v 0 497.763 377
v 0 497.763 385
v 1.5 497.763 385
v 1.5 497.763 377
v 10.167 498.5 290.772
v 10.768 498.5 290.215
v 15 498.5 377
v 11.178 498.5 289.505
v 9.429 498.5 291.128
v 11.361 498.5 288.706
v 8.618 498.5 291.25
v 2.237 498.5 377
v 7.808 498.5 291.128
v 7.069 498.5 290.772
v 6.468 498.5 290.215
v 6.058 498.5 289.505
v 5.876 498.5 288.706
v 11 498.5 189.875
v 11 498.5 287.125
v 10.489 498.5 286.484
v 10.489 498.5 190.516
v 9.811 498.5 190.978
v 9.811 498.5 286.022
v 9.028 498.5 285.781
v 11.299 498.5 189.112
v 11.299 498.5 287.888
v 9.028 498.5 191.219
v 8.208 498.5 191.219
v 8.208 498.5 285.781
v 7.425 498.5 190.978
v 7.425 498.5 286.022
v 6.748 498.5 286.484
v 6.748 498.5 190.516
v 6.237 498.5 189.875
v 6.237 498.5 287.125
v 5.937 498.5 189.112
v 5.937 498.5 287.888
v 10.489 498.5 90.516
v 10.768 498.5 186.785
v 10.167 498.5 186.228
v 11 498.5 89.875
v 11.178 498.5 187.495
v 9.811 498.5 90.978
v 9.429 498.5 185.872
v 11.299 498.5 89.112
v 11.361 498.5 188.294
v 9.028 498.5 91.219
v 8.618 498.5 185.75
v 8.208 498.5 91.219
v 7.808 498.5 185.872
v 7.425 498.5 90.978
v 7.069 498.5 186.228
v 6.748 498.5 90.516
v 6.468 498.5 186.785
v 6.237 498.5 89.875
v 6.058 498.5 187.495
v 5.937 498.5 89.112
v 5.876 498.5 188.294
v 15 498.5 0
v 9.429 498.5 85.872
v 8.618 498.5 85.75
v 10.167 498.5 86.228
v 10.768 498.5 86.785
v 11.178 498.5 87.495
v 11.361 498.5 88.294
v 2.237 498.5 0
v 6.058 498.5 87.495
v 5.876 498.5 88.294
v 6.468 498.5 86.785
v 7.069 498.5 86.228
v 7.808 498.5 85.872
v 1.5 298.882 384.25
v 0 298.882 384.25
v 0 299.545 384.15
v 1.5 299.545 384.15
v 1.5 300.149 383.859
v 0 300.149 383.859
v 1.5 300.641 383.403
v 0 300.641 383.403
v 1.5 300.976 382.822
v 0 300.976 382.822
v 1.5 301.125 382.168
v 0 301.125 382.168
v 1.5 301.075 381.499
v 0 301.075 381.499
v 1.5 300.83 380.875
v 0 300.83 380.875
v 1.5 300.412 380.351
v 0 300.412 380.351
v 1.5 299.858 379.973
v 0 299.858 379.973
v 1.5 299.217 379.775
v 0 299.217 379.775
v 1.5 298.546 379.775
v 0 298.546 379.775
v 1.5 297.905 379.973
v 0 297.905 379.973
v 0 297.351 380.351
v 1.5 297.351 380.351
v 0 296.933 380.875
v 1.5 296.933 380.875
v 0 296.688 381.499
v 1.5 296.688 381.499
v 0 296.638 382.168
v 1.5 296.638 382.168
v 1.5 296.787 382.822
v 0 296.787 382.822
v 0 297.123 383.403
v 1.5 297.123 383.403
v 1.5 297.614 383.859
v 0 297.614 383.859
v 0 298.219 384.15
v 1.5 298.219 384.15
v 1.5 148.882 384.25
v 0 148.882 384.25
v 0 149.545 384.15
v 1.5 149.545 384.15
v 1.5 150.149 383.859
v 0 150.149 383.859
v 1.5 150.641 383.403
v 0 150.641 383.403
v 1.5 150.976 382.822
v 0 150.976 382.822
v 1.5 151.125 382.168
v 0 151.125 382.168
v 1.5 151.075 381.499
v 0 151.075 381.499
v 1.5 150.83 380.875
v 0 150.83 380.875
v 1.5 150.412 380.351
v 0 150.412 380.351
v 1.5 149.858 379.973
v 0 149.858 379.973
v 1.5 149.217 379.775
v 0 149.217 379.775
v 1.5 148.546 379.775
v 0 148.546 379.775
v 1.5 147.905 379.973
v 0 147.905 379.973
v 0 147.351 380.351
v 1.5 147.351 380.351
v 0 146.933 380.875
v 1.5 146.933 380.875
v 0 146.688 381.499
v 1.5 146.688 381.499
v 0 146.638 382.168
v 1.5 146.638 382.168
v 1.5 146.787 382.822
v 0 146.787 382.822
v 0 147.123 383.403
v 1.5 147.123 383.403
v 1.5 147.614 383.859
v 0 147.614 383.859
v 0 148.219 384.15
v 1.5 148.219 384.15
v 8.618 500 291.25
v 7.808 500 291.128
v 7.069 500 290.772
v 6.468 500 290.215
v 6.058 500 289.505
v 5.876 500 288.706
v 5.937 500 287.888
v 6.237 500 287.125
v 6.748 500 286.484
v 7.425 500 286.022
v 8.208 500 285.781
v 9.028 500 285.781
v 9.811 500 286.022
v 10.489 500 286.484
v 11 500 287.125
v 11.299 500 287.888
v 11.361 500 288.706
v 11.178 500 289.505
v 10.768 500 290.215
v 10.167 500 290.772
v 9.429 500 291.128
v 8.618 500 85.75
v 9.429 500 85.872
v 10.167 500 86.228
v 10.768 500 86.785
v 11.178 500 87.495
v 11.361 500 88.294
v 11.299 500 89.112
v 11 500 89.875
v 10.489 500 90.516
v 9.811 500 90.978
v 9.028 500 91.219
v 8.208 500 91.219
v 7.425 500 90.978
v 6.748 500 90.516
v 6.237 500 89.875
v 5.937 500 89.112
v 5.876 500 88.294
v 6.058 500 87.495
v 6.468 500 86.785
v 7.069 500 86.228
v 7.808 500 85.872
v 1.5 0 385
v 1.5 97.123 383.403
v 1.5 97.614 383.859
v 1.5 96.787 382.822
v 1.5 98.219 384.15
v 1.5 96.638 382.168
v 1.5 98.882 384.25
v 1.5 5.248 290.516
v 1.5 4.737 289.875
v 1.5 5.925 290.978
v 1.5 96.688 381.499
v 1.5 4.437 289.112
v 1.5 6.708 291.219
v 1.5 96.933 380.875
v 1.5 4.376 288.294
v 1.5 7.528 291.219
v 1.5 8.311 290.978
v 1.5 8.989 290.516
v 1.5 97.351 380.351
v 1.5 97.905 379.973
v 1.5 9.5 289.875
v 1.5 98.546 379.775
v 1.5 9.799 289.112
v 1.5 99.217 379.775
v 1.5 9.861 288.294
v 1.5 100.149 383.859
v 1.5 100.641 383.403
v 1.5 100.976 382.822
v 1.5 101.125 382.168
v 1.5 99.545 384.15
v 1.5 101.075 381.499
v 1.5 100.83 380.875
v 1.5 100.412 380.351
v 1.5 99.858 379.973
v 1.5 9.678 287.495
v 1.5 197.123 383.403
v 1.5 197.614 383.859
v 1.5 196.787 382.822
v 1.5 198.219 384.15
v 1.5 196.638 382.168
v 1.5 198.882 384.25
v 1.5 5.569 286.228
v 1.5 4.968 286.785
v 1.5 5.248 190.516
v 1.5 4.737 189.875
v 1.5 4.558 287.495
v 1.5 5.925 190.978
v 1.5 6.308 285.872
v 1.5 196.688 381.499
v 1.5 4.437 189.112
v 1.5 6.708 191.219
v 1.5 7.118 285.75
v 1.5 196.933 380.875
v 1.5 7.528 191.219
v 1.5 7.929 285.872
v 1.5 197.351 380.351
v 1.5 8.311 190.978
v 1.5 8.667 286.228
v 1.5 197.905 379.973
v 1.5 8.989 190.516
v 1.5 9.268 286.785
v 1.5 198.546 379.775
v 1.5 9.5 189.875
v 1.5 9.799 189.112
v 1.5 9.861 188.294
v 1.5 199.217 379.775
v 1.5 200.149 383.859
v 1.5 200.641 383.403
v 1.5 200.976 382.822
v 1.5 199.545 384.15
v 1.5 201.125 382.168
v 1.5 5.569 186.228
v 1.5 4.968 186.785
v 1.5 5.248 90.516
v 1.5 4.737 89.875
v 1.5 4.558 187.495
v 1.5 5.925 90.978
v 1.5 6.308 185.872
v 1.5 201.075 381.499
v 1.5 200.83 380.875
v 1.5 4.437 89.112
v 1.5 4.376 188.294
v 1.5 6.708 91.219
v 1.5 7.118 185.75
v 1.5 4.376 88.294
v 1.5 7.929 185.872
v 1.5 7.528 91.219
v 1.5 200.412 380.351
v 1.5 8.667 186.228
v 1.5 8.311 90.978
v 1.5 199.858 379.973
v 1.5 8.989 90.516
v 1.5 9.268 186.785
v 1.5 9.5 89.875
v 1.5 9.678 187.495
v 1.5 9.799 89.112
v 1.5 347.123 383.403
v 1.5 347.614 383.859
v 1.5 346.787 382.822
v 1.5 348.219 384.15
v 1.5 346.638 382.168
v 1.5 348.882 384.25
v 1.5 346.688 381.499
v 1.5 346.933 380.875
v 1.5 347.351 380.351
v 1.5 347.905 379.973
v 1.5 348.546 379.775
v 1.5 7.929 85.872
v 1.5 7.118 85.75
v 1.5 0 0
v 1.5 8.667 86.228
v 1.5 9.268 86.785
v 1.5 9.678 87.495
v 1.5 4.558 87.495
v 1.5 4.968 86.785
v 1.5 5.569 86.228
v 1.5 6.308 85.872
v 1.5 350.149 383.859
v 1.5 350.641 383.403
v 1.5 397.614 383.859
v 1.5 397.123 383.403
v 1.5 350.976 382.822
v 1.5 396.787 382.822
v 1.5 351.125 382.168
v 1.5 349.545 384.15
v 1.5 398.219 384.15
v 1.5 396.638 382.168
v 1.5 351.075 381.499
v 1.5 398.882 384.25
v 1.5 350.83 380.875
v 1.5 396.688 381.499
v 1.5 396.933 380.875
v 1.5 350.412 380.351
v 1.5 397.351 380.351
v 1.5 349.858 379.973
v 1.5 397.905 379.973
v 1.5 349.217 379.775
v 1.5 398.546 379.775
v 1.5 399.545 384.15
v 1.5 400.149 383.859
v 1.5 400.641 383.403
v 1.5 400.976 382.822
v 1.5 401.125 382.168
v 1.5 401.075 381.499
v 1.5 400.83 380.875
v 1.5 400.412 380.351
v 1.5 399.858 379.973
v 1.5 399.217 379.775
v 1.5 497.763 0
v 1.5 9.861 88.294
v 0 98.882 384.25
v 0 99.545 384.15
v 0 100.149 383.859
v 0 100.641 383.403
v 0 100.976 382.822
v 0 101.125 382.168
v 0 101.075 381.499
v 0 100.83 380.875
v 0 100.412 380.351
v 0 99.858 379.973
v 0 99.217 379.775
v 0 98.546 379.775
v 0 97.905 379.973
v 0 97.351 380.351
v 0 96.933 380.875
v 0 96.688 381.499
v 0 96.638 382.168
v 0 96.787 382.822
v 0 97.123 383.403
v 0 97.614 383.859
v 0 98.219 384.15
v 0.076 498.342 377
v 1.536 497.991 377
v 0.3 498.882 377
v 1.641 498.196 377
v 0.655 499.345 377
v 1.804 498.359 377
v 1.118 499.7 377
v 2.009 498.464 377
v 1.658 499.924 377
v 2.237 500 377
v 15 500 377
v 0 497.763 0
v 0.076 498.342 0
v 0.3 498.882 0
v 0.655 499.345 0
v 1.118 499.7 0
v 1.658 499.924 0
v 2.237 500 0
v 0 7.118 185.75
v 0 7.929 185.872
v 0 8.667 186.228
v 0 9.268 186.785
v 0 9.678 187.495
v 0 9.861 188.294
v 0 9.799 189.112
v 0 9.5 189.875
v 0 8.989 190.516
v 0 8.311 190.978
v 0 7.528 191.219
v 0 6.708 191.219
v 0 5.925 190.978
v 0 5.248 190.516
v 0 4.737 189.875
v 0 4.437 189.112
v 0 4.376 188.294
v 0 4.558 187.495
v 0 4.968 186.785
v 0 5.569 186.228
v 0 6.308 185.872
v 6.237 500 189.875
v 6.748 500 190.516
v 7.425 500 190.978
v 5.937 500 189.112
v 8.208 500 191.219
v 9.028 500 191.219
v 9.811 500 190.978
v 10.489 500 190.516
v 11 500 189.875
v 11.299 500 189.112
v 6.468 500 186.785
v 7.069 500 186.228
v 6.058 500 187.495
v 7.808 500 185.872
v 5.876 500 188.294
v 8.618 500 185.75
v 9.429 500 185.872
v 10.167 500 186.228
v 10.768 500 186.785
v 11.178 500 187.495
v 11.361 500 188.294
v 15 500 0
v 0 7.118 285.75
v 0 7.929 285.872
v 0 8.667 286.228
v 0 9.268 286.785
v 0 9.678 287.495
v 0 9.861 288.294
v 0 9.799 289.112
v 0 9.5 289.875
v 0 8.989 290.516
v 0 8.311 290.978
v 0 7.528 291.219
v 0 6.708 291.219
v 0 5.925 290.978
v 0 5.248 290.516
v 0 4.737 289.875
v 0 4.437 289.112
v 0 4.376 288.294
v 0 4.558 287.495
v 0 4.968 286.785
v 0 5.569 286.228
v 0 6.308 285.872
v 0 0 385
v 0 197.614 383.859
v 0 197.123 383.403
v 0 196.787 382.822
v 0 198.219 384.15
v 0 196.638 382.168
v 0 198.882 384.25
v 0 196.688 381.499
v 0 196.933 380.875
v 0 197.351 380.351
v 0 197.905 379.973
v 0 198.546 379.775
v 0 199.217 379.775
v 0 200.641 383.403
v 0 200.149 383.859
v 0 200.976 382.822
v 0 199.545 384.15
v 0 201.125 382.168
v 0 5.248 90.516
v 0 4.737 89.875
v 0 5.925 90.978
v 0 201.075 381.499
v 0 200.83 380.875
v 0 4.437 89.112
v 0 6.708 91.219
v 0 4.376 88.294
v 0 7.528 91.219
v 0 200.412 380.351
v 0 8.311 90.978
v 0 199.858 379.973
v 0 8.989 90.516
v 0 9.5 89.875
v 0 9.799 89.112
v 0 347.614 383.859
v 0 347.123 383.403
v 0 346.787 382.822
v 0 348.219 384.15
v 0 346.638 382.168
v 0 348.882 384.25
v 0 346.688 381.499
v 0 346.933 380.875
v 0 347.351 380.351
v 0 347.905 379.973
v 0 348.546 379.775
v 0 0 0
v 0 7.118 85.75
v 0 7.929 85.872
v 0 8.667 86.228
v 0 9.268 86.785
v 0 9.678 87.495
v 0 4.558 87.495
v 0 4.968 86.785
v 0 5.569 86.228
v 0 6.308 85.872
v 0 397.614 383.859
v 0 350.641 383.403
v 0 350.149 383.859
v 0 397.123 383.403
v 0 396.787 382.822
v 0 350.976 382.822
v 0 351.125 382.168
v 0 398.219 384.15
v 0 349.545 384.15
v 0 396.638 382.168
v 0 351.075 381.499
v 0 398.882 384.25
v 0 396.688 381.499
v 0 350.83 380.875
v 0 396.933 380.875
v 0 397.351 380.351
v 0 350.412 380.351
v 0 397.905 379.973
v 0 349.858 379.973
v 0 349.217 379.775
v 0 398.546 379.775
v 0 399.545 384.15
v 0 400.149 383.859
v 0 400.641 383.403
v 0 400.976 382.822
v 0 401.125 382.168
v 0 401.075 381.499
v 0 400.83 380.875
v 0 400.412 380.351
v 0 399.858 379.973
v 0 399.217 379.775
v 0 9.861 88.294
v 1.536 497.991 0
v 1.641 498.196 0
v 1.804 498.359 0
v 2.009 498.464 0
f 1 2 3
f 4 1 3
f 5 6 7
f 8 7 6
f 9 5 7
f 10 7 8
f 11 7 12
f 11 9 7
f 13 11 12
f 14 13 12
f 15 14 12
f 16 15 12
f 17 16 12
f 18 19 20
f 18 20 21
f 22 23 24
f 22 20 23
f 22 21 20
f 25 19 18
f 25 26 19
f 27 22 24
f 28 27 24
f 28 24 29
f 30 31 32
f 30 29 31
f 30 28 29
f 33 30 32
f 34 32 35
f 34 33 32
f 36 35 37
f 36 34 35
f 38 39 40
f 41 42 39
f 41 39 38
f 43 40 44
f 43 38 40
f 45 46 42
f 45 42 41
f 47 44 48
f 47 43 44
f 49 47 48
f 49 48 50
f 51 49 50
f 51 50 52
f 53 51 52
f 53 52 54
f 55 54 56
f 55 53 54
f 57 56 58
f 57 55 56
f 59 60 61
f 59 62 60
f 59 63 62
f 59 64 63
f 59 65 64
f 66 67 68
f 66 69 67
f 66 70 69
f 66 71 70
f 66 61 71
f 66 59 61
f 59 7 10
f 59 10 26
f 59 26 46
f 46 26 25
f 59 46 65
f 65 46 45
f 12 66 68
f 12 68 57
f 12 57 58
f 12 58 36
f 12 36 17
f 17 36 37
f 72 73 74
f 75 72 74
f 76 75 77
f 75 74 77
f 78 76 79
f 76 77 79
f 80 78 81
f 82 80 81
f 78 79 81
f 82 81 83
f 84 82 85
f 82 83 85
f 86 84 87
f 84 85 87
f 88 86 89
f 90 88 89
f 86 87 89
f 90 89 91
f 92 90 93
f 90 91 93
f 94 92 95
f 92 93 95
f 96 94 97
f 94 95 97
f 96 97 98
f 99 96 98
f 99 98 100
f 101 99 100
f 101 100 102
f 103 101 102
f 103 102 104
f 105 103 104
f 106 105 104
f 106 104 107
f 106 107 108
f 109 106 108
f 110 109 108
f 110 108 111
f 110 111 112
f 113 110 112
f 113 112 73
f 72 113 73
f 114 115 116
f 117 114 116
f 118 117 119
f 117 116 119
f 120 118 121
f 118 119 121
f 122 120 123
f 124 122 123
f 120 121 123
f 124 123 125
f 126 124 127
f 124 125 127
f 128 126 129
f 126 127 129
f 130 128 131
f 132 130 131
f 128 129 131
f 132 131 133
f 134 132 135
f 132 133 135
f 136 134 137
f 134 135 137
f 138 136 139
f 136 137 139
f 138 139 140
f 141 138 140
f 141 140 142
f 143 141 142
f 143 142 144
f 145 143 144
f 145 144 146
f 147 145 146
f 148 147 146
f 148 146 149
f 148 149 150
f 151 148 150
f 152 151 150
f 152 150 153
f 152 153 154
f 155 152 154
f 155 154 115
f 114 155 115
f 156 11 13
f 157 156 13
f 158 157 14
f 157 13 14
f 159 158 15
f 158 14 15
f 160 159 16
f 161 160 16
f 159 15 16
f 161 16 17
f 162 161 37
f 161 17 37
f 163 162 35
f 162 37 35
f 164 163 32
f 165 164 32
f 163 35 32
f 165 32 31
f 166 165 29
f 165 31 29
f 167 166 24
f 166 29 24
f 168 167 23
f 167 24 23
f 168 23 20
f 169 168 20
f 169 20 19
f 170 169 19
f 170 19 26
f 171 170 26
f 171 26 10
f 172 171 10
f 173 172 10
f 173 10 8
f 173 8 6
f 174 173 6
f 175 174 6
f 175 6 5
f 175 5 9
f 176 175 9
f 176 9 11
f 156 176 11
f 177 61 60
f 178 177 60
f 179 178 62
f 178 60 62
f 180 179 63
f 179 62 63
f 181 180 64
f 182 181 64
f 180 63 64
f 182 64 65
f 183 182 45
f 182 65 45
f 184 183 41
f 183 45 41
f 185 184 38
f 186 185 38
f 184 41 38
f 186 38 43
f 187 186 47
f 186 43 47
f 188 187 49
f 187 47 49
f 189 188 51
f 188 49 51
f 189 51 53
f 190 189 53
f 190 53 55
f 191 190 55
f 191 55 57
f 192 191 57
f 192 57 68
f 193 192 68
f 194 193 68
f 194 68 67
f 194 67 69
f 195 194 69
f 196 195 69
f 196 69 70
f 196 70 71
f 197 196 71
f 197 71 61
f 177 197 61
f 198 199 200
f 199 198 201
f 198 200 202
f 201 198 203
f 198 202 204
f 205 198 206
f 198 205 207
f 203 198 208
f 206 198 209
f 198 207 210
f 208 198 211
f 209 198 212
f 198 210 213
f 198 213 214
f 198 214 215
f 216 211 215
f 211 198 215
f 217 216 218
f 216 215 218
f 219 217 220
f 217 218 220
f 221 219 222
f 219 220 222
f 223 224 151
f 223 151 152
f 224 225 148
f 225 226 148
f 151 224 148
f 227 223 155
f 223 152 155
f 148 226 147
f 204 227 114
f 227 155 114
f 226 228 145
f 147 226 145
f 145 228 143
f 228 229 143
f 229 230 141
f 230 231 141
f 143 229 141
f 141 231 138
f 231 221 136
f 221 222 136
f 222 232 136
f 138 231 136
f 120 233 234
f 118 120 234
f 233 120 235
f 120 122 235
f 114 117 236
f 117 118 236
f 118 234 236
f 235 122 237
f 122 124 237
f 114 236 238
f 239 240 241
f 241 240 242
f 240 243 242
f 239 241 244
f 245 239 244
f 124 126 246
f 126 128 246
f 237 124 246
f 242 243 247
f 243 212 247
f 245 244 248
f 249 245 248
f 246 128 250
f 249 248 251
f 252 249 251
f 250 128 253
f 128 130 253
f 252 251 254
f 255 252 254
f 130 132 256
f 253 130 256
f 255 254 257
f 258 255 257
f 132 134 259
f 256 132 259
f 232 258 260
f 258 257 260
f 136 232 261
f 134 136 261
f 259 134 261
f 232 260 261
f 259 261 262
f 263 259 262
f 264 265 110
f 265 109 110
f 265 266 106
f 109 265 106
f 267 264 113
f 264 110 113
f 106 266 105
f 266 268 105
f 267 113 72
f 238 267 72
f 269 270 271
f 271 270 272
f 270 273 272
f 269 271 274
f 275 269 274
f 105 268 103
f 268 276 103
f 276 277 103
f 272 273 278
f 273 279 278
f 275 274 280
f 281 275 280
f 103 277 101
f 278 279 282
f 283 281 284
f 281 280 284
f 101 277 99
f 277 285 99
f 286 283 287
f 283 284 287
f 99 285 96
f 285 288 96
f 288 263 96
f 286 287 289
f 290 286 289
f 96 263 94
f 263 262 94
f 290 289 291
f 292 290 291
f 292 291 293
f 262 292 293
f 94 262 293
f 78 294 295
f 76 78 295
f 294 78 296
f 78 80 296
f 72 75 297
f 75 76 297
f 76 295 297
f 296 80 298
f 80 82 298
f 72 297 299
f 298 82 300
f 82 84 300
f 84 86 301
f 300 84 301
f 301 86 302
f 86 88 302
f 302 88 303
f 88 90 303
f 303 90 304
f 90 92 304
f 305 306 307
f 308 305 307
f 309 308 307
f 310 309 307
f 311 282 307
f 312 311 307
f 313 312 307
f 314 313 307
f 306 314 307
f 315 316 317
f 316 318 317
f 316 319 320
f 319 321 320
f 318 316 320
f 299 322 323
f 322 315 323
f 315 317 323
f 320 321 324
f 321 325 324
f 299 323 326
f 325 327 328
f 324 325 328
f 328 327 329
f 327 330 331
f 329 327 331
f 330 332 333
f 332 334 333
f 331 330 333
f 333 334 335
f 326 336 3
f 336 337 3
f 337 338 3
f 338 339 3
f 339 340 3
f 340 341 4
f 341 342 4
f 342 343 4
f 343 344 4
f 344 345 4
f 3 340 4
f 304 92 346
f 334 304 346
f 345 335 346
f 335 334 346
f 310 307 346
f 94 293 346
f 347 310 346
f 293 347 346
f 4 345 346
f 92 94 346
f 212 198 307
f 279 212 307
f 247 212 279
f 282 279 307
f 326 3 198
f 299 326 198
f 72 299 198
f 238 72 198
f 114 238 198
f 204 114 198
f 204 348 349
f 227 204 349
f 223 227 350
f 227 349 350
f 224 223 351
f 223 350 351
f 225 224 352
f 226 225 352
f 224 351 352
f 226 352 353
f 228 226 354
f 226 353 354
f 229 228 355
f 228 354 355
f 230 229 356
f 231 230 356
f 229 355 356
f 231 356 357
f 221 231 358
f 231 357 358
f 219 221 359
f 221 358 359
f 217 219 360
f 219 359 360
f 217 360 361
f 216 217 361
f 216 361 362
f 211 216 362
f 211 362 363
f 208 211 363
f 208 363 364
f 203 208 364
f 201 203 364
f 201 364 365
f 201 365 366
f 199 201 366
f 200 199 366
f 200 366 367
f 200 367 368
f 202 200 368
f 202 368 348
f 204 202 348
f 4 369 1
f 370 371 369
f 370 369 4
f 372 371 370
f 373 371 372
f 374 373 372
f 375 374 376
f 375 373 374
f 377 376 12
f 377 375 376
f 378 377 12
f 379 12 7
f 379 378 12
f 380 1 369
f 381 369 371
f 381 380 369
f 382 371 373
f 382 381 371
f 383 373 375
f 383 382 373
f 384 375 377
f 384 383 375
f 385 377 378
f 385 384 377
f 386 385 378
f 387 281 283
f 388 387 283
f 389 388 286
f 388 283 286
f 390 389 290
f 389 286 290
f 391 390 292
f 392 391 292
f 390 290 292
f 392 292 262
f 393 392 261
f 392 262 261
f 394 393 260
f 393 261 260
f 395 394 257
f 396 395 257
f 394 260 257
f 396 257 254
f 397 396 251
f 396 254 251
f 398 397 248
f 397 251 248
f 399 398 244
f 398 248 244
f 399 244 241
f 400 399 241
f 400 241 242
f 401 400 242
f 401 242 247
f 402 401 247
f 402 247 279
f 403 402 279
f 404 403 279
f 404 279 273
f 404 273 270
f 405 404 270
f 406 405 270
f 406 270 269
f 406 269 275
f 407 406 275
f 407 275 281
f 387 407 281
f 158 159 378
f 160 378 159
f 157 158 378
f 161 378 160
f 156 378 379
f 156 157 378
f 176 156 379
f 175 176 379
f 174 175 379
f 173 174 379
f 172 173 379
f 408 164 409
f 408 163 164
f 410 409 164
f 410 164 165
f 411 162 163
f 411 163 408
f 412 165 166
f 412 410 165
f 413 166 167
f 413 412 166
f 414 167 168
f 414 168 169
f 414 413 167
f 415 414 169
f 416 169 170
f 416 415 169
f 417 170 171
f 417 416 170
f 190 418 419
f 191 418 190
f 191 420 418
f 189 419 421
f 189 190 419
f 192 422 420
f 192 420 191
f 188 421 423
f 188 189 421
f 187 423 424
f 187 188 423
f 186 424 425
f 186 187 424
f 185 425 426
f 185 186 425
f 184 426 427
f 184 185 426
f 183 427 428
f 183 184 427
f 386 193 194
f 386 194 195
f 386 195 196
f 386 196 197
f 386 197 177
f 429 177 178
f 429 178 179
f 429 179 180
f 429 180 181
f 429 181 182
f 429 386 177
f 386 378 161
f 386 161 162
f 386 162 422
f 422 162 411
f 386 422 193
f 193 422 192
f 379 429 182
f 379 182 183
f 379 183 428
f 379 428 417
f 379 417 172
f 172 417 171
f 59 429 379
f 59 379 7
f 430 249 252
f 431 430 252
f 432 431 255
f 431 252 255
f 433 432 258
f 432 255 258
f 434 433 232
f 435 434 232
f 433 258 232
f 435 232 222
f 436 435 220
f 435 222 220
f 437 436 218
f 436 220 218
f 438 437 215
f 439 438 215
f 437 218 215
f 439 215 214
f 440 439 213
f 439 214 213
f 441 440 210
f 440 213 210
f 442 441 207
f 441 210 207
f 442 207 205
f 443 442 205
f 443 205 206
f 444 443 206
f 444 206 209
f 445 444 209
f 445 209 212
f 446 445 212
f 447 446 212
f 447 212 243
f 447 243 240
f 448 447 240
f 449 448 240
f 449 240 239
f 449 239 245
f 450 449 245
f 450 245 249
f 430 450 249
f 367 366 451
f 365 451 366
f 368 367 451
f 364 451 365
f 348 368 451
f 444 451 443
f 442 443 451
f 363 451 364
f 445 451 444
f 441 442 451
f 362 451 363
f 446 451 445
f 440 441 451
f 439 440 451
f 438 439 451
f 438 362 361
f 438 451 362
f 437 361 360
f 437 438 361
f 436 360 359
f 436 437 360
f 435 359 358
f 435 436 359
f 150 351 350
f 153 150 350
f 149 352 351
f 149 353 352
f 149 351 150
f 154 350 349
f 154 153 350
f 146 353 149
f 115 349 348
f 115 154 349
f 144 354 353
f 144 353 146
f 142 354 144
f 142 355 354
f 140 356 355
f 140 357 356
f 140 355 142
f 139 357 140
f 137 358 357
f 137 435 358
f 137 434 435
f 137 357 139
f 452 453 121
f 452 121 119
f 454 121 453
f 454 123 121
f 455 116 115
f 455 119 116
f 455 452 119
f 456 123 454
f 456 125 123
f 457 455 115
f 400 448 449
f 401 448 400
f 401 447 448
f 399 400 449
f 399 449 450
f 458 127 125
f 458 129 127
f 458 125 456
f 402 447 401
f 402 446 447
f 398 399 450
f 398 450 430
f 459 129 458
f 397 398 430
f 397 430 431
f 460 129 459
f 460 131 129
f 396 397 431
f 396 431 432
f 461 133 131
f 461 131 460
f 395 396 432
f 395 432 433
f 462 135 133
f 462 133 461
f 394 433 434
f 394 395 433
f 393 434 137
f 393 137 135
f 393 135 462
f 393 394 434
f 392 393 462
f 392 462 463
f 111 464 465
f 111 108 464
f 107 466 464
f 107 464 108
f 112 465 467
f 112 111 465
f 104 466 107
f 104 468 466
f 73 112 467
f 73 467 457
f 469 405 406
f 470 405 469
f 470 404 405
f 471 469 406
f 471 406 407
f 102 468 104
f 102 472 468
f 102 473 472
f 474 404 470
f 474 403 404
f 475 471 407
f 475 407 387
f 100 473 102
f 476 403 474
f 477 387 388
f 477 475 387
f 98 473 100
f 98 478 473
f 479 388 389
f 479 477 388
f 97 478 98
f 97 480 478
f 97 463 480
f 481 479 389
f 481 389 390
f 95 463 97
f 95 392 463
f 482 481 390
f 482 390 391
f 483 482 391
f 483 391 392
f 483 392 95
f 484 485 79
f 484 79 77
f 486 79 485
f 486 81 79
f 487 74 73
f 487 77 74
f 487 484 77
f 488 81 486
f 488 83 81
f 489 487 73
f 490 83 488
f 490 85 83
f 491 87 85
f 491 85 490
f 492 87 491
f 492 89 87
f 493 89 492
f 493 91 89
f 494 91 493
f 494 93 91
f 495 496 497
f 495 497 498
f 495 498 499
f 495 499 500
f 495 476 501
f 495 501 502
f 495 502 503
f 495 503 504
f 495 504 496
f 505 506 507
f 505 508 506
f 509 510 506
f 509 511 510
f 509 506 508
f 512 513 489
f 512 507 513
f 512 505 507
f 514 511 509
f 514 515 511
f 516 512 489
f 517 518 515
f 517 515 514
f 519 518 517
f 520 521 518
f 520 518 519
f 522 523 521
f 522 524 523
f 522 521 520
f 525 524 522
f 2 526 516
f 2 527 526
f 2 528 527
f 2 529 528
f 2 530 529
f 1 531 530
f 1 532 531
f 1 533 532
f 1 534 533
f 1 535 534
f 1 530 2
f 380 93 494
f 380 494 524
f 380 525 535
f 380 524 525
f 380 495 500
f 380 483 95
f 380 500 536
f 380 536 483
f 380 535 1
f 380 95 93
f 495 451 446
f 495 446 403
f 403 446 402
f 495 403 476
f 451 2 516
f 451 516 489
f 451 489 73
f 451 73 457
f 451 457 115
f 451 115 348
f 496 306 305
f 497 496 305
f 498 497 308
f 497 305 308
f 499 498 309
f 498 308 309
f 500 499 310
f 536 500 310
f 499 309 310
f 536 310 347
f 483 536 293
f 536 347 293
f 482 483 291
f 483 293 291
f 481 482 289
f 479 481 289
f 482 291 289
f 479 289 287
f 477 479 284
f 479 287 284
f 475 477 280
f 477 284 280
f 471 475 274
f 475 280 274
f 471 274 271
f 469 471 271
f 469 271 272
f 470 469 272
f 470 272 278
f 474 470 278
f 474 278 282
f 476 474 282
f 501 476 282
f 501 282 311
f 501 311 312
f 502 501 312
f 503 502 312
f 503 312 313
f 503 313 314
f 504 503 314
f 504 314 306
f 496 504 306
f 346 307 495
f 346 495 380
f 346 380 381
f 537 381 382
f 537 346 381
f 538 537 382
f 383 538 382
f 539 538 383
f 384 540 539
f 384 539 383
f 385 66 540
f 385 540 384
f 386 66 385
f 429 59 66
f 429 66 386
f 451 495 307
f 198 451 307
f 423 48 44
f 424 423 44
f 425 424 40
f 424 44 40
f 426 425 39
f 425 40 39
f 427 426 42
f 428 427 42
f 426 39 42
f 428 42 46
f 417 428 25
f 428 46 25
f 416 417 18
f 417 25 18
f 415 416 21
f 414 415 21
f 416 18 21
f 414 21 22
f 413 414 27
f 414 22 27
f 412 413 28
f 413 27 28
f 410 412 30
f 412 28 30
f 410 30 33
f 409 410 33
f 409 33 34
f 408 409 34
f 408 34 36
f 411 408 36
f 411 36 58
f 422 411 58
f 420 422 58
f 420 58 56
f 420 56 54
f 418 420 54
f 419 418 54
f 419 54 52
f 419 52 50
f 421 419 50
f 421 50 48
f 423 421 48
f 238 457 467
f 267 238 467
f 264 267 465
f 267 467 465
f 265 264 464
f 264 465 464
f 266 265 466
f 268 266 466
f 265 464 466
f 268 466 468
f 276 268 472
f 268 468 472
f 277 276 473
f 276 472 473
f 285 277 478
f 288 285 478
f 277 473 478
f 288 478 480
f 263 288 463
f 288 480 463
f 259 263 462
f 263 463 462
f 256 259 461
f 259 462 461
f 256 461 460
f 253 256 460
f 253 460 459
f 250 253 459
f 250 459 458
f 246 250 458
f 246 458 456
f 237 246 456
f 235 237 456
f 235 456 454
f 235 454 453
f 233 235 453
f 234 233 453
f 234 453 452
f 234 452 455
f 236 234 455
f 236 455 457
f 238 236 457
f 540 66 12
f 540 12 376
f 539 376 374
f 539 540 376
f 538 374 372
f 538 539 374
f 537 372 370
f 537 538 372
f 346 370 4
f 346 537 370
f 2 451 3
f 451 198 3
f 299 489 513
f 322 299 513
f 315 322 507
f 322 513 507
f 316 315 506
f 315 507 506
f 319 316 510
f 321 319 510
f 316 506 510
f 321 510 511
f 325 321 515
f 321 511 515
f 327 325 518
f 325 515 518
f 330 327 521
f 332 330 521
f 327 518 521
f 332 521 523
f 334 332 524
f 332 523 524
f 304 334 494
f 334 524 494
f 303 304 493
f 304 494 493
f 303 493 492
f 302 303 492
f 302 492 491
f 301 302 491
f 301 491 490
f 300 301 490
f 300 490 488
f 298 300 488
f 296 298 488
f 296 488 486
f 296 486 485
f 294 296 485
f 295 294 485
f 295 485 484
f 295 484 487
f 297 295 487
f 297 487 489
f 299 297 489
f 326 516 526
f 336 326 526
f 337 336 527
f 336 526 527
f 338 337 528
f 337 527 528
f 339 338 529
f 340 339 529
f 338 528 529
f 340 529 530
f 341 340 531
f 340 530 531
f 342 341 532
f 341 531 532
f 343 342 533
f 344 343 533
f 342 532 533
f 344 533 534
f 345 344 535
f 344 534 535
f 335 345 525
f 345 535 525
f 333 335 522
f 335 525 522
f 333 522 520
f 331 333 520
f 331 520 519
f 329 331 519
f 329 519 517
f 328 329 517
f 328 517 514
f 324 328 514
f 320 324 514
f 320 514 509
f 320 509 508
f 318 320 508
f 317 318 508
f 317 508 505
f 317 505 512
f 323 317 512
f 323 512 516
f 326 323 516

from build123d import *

# Parameters (mm, degrees)
SKETCH_1_W                       = 1.5
SKETCH_1_H                       = 500
SM_BASE_FLANGE_1_DEPTH           = 385
SM_EDGE_FLANGE_1_STRIP_W         = 7.4732
SM_EDGE_FLANGE_1_STRIP_H         = 1.5
SM_EDGE_FLANGE_1_STRIP_CUT_DEPTH = 385
SM_EDGE_FLANGE_1_DEPTH           = 385
SKETCH_12_W                      = 16.530990935
SKETCH_12_H                      = 8.400471009
CUT_EXTRUDE_1_DEPTH              = 8
SKETCH_13_R                      = 2.75
CUT_EXTRUDE_2_DEPTH              = 20
SKETCH_14_R                      = 2.75
CUT_EXTRUDE_3_DEPTH              = 10
SKETCH_15_R                      = 2.25
CUT_EXTRUDE_4_DEPTH              = 10


# Sheet-metal steps are written as plain solids
with BuildPart() as part:
    # Sketch 1 → 基体-法兰1 (new body)
    with BuildSketch(Plane.XY):
        with Locations((0.75, 250)):
            Rectangle(SKETCH_1_W, SKETCH_1_H)
    extrude(amount=SM_BASE_FLANGE_1_DEPTH)

    # 边线-法兰1 strip (across the edge) → 边线-法兰1 strip cut (cut)
    with BuildSketch(Plane(origin=(1.5, 500, 0), x_dir=(0, -1, 0), z_dir=(0, 0, 1))):
        with Locations((-1.5, -0.75)):
            Rectangle(SM_EDGE_FLANGE_1_STRIP_W, SM_EDGE_FLANGE_1_STRIP_H)
    extrude(amount=SM_EDGE_FLANGE_1_STRIP_CUT_DEPTH, mode=Mode.SUBTRACT)

    # 边线-法兰1 section (across the edge) → 边线-法兰1 (add)
    with BuildSketch(Plane(origin=(1.5, 500, 0), x_dir=(0, -1, 0), z_dir=(0, 0, 1))):
        with BuildLine():
            Line((0, 0.7366), (0, 13.5))
            Line((0, 13.5), (1.5, 13.5))
            Line((1.5, 13.5), (1.5, 0.7366))
            ThreePointArc((1.5, 0.7366), (1.715745145, 0.215745145), (2.2366, 0))
            Line((2.2366, 0), (2.2366, -1.5))
            ThreePointArc((2.2366, -1.5), (0.655084973, -0.844915027), (0, 0.7366))
        make_face()
    extrude(amount=SM_EDGE_FLANGE_1_DEPTH)

    # 草图12 → 切除-拉伸1 (cut)
    with BuildSketch(Plane.XY.offset(385)):
        with Locations((8.265495468, 501.963635505)):
            Rectangle(SKETCH_12_W, SKETCH_12_H)
    extrude(amount=-CUT_EXTRUDE_1_DEPTH, mode=Mode.SUBTRACT)

    # 草图13 → 切除-拉伸2 (cut)
    with BuildSketch(Plane(origin=(1.5, 0, 0), x_dir=(0, 0, -1), z_dir=(1, 0, 0))):
        with Locations((-288.5, 7.1183)):
            Circle(SKETCH_13_R)
        with Locations((-188.5, 7.1183)):
            Circle(SKETCH_13_R)
        with Locations((-88.5, 7.1183)):
            Circle(SKETCH_13_R)
    extrude(amount=-CUT_EXTRUDE_2_DEPTH, mode=Mode.SUBTRACT)

    # 草图14 → 切除-拉伸3 (cut)
    with BuildSketch(Plane.XZ.offset(-498.5)):
        with Locations(Location((8.6183, 88.5, 0), (0, 0, 270))):
            Circle(SKETCH_14_R)
        with Locations(Location((8.6183, 188.5, 0), (0, 0, 270))):
            Circle(SKETCH_14_R)
        with Locations(Location((8.6183, 288.5, 0), (0, 0, 90))):
            Circle(SKETCH_14_R)
    extrude(amount=-CUT_EXTRUDE_3_DEPTH, mode=Mode.SUBTRACT)

    # 草图15 → 切除-拉伸4 (cut)
    with BuildSketch(Plane.ZY):
        with Locations((382, 98.8817)):
            Circle(SKETCH_15_R)
        with Locations((382, 148.8817)):
            Circle(SKETCH_15_R)
        with Locations((382, 198.8817)):
            Circle(SKETCH_15_R)
        with Locations((382, 298.8817)):
            Circle(SKETCH_15_R)
        with Locations((382, 348.8817)):
            Circle(SKETCH_15_R)
        with Locations((382, 398.8817)):
            Circle(SKETCH_15_R)
    extrude(amount=-CUT_EXTRUDE_4_DEPTH, mode=Mode.SUBTRACT)


solid = part.part
